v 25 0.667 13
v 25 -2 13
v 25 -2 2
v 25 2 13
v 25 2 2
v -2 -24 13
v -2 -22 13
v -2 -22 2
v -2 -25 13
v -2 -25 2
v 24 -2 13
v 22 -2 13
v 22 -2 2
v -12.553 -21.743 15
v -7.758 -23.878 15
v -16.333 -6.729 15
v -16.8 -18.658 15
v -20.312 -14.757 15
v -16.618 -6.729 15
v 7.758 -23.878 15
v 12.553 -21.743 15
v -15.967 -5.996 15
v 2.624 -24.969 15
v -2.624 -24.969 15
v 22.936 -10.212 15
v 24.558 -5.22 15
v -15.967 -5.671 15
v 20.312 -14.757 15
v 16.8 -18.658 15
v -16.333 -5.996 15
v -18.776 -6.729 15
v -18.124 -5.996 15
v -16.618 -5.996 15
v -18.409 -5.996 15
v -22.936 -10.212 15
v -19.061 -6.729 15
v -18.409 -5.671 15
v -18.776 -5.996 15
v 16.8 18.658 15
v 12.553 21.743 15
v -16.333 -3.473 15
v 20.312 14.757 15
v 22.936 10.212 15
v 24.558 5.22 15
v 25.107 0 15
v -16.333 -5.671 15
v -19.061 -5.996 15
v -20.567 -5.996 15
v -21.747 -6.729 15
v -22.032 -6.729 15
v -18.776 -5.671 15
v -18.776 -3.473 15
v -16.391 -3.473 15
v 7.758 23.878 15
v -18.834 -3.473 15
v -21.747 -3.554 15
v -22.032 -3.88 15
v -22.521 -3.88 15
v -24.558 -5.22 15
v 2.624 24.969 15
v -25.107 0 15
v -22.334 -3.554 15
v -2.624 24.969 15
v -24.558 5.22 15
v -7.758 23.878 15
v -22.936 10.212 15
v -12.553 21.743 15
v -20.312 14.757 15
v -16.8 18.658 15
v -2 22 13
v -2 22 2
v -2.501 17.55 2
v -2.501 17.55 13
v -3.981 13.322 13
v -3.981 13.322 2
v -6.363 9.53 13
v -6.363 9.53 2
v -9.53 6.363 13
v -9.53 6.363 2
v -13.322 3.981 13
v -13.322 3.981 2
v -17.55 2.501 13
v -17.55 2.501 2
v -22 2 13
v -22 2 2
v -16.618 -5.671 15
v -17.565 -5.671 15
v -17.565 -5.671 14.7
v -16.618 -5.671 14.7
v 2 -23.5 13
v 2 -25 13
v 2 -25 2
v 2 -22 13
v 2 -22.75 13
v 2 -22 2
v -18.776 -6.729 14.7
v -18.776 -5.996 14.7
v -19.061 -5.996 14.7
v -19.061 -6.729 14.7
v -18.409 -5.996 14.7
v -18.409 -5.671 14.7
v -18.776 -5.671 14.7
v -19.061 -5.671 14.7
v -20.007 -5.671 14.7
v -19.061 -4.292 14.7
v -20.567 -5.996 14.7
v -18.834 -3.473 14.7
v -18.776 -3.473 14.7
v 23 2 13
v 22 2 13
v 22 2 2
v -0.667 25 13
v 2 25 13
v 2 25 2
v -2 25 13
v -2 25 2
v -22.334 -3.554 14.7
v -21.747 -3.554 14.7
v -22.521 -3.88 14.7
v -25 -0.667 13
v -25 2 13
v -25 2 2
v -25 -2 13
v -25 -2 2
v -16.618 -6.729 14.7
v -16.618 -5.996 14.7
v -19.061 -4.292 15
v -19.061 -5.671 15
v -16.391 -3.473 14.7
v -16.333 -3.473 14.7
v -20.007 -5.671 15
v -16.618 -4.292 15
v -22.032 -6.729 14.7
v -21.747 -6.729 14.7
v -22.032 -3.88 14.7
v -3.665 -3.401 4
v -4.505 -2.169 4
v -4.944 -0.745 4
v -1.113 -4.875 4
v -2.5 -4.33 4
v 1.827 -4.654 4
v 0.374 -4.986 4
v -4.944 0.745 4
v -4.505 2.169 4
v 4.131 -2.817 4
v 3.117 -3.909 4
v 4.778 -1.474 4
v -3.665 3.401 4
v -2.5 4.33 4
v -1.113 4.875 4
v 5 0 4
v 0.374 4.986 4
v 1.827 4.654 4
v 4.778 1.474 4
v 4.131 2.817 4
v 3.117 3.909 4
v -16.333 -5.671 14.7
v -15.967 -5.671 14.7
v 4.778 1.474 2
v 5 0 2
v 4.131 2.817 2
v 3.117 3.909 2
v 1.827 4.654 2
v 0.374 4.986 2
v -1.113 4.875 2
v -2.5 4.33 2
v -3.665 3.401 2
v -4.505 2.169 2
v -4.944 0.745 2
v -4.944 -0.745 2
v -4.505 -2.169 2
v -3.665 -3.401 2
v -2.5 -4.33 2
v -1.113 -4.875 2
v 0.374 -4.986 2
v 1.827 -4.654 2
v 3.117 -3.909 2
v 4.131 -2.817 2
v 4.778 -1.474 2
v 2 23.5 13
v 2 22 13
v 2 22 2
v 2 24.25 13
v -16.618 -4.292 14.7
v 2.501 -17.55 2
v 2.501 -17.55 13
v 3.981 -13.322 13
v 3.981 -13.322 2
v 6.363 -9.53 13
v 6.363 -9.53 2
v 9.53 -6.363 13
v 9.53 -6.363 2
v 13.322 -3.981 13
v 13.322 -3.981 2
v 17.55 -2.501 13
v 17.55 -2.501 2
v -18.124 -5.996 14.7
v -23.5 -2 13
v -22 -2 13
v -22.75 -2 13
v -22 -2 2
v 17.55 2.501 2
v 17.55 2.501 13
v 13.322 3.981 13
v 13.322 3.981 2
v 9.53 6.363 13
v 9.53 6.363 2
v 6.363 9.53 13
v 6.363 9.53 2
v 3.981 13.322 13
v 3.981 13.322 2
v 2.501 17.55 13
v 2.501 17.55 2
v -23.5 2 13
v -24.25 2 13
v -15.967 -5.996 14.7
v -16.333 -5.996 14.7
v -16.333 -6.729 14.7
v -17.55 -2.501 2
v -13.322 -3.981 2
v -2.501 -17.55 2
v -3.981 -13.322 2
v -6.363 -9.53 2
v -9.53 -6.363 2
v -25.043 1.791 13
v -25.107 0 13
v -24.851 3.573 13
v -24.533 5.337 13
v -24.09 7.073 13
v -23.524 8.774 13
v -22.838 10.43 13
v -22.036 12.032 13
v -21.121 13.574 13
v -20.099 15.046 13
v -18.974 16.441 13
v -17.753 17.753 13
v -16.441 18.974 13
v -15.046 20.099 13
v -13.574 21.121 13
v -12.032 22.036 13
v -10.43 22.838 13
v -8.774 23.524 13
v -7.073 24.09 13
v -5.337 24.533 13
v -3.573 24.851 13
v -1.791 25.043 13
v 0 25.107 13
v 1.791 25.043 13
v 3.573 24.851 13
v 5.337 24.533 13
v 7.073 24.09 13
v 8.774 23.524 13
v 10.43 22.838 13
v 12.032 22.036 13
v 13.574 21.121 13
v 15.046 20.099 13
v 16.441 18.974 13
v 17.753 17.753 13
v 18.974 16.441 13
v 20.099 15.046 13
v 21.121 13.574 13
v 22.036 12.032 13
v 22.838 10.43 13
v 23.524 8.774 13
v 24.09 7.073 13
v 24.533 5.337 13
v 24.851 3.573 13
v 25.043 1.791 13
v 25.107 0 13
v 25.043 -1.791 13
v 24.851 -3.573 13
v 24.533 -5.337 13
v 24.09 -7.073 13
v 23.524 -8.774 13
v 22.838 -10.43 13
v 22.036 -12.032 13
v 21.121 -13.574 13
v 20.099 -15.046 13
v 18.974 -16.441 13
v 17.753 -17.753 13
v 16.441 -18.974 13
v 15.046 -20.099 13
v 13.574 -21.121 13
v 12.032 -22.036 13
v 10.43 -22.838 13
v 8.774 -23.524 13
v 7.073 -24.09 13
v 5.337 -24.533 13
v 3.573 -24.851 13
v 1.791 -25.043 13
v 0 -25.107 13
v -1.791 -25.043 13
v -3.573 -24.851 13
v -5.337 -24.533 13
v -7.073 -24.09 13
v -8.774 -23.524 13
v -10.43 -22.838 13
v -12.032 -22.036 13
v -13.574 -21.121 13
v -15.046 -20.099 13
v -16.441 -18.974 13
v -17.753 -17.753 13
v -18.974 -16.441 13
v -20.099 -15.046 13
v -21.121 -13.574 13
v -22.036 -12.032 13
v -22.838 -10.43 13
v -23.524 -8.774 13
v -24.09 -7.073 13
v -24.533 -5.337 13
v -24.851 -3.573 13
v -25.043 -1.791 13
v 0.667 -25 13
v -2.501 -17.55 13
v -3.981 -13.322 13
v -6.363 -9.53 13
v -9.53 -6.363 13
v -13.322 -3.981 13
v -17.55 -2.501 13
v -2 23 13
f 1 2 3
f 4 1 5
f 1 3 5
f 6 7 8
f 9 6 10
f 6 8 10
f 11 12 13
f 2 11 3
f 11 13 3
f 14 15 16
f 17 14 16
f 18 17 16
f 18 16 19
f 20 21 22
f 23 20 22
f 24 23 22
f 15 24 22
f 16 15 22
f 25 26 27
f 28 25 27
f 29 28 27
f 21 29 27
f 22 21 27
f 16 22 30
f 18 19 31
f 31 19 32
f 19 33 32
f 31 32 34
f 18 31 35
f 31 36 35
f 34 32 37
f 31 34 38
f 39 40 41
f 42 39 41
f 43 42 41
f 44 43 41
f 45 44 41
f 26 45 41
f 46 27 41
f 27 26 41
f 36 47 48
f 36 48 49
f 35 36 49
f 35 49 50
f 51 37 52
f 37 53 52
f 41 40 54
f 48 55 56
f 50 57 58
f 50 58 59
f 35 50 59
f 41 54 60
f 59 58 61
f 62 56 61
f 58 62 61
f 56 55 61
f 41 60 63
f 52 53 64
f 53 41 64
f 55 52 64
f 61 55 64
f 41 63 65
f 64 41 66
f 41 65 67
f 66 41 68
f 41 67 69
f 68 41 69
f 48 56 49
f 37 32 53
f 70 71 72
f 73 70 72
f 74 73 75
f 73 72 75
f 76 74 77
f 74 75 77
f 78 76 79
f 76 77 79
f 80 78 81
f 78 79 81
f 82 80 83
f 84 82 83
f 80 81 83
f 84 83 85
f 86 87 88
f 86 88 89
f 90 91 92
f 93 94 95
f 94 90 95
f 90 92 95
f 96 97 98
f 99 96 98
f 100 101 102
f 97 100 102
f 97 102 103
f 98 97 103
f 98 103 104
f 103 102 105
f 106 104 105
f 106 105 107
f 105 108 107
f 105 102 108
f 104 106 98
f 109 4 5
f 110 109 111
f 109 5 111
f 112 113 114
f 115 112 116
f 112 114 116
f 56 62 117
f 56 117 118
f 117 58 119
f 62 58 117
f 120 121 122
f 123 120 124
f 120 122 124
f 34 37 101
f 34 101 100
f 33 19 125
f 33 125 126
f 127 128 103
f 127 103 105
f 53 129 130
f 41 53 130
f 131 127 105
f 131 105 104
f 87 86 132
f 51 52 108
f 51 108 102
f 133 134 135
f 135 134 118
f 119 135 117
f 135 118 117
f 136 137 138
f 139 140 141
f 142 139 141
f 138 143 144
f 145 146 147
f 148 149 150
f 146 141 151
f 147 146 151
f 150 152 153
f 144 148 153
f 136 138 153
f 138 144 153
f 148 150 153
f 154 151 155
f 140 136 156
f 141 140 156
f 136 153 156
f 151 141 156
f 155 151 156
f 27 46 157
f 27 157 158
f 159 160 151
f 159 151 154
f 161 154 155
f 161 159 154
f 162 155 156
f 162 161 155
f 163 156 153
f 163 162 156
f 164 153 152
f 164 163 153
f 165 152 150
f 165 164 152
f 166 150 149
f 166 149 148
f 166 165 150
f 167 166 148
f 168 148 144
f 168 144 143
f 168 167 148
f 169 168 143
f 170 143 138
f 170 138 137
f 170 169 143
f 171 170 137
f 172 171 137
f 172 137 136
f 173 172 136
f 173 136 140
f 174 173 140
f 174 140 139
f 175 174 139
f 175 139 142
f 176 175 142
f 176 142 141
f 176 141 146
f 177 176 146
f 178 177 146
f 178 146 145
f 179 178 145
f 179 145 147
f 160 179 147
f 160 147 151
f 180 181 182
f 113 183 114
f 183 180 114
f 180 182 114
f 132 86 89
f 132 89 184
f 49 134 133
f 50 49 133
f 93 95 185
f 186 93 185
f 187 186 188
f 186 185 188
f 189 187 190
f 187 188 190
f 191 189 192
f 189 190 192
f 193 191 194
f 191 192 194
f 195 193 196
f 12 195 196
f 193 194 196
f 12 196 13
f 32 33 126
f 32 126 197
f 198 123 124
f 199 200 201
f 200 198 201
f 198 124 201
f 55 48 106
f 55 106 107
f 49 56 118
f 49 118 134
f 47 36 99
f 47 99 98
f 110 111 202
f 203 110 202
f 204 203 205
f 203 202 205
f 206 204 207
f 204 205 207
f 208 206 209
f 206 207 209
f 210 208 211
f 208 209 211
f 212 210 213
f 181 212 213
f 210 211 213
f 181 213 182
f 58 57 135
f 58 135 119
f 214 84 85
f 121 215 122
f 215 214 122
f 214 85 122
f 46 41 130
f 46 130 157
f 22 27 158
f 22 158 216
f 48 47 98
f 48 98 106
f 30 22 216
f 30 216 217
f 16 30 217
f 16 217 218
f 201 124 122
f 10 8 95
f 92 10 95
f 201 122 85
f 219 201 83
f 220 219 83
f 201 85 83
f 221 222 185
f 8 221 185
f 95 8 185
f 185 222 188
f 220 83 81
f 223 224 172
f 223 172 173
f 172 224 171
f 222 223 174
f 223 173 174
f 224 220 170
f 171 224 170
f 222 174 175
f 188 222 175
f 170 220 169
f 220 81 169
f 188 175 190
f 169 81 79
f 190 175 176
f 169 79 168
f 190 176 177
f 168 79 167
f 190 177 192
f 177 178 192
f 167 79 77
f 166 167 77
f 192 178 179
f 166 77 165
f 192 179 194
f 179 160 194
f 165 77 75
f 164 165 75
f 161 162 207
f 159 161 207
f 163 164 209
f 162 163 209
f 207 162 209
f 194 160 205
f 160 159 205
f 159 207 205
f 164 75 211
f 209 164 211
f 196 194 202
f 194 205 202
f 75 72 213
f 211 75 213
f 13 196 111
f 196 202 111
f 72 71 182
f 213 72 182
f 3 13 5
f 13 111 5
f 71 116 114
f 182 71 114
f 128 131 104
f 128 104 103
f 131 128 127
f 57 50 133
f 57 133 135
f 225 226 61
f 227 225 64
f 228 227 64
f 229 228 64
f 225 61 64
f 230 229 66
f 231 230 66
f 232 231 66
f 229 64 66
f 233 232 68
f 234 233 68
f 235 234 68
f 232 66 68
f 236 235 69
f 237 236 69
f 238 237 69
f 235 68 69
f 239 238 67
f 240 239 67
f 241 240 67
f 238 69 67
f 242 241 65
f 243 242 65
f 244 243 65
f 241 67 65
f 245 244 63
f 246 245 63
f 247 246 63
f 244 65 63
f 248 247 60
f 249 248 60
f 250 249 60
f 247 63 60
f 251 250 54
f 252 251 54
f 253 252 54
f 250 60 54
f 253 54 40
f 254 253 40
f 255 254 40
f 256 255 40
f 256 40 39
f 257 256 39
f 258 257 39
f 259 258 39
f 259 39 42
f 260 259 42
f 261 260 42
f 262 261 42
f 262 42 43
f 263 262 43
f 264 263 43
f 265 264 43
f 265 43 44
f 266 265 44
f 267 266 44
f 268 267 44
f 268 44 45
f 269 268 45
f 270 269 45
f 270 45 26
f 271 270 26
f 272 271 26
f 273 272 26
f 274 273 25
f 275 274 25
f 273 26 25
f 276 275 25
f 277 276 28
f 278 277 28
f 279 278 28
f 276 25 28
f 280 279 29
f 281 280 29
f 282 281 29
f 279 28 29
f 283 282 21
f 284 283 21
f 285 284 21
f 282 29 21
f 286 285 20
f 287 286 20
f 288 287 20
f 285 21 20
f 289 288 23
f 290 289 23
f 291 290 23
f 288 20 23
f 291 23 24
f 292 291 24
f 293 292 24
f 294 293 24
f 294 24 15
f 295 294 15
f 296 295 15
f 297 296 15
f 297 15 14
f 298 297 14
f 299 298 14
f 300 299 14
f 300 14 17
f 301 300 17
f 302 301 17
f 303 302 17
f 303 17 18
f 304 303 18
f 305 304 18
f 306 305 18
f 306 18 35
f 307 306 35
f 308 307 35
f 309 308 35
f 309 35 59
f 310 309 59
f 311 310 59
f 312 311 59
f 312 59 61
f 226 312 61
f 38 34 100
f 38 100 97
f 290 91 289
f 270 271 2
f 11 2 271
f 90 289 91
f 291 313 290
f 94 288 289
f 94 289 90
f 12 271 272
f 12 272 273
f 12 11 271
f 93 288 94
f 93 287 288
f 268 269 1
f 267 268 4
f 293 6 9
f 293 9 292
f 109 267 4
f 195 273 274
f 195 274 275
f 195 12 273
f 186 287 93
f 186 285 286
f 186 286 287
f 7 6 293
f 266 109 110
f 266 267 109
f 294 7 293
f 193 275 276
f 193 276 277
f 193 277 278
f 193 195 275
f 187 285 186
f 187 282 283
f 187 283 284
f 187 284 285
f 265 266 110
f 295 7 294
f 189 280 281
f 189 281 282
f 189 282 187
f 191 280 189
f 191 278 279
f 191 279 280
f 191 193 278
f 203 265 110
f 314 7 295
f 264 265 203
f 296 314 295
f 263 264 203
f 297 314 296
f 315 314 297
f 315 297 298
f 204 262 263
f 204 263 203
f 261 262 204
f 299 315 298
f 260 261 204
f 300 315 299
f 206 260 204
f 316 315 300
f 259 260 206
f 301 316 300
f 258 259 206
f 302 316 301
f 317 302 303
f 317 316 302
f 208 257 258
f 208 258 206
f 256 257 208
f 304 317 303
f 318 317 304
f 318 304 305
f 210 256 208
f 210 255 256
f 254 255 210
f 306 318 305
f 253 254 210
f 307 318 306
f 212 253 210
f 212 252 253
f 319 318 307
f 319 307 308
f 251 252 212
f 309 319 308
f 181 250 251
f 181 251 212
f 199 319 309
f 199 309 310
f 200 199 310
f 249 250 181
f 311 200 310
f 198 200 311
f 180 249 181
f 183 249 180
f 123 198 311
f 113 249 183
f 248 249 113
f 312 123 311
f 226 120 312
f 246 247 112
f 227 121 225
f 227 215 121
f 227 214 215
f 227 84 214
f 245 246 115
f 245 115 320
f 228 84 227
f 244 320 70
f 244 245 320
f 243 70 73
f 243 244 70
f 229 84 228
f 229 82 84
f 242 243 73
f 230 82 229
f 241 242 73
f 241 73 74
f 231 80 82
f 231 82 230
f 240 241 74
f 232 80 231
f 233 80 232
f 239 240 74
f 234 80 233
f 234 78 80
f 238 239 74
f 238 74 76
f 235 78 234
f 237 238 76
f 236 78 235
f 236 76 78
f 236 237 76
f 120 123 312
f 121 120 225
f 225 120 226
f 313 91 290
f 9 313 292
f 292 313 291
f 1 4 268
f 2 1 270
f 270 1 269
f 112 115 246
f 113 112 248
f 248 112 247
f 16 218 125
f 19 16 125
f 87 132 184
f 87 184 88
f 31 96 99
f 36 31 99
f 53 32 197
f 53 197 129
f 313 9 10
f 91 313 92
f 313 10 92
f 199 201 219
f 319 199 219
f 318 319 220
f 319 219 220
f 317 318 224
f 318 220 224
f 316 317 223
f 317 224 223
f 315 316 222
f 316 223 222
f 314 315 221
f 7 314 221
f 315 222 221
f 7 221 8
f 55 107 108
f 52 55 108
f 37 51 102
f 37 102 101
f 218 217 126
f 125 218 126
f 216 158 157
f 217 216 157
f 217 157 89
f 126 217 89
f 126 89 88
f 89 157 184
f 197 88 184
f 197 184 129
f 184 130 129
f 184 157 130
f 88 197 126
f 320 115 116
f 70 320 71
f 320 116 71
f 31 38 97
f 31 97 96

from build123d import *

# Parameters (mm, degrees)
BOSS_EXTRUDE1_START = 2
BOSS_EXTRUDE1_DEPTH = 13
SKETCH7_R           = 25.106657787
BOSS_EXTRUDE3_DEPTH = 2
SKETCH8_R           = 5
CUT_EXTRUDE2_DEPTH  = 4
CUT_EXTRUDE3_DEPTH  = 0.3


with BuildPart() as part:
    # Sketch4 → Boss-Extrude1 (new body)
    with BuildSketch(Plane.XY.offset(BOSS_EXTRUDE1_START)):
        with BuildLine():
            Line((-25, 2), (-25, 0))
            Line((-25, 0), (25, 0))
            Line((25, 0), (25, 2))
            Line((25, 2), (22, 2))
            ThreePointArc((22, 2), (7.857864376, 7.857864376), (2, 22))
            Line((2, 22), (2, 25))
            Line((2, 25), (-2, 25))
            Line((-2, 25), (-2, 22))
            ThreePointArc((-2, 22), (-7.857864376, 7.857864376), (-22, 2))
            Line((-22, 2), (-25, 2))
        make_face()
        with BuildLine():
            Line((25, 0), (-25, 0))
            Line((-25, 0), (-25, -2))
            Line((-25, -2), (-22, -2))
            ThreePointArc((-22, -2), (-7.857864376, -7.857864376), (-2, -22))
            Line((-2, -22), (-2, -25))
            Line((-2, -25), (2, -25))
            Line((2, -25), (2, -22))
            ThreePointArc((2, -22), (7.857864376, -7.857864376), (22, -2))
            Line((22, -2), (25, -2))
            Line((25, -2), (25, 0))
        make_face()
    extrude(amount=BOSS_EXTRUDE1_DEPTH)

    # Sketch7 → Boss-Extrude3 (add)
    with BuildSketch(Plane(origin=(0, 0, 15), x_dir=(-1, 0, 0), z_dir=(0, 0, -1))):
        Circle(SKETCH7_R)
    extrude(amount=BOSS_EXTRUDE3_DEPTH)

    # Sketch8 → Cut-Extrude2 (cut)
    with BuildSketch(Plane.XY):
        Circle(SKETCH8_R)
    extrude(amount=CUT_EXTRUDE2_DEPTH, mode=Mode.SUBTRACT)

    # Sketch11 → Cut-Extrude3 (cut)
    # profile 1 of 3: a face of its own
    with BuildSketch(Plane.XY.offset(15)):
        Polygon((-22.334208893, -3.554058613), (-21.747164623, -3.554058613), (-21.747164623, -6.729058613), (-22.03210052, -6.729058613), (-22.03210052, -3.879699638), (-22.520562059, -3.879699638), align=None)
    # profile 2 of 3: a face of its own
    with BuildSketch(Plane.XY.offset(15)):
        Polygon((-18.833567868, -3.472648356), (-18.775690264, -3.472648356), (-18.775690264, -5.670725279), (-18.40934411, -5.670725279), (-18.40934411, -5.996366305), (-18.775690264, -5.996366305), (-18.775690264, -6.729058613), (-19.060626161, -6.729058613), (-19.060626161, -5.996366305), (-20.566715905, -5.996366305), align=None)
        Polygon((-19.060626161, -5.670725279), (-19.060626161, -4.291839062), (-20.007020392, -5.670725279), align=None, mode=Mode.SUBTRACT)
    # profile 3 of 3: a face of its own
    with BuildSketch(Plane.XY.offset(15)):
        Polygon((-16.391260175, -3.472648356), (-16.333382571, -3.472648356), (-16.333382571, -5.670725279), (-15.967036417, -5.670725279), (-15.967036417, -5.996366305), (-16.333382571, -5.996366305), (-16.333382571, -6.729058613), (-16.618318469, -6.729058613), (-16.618318469, -5.996366305), (-18.124408212, -5.996366305), align=None)
        Polygon((-16.618318469, -5.670725279), (-16.618318469, -4.291839062), (-17.5647127, -5.670725279), align=None, mode=Mode.SUBTRACT)
    extrude(amount=-CUT_EXTRUDE3_DEPTH, mode=Mode.SUBTRACT)


solid = part.part
